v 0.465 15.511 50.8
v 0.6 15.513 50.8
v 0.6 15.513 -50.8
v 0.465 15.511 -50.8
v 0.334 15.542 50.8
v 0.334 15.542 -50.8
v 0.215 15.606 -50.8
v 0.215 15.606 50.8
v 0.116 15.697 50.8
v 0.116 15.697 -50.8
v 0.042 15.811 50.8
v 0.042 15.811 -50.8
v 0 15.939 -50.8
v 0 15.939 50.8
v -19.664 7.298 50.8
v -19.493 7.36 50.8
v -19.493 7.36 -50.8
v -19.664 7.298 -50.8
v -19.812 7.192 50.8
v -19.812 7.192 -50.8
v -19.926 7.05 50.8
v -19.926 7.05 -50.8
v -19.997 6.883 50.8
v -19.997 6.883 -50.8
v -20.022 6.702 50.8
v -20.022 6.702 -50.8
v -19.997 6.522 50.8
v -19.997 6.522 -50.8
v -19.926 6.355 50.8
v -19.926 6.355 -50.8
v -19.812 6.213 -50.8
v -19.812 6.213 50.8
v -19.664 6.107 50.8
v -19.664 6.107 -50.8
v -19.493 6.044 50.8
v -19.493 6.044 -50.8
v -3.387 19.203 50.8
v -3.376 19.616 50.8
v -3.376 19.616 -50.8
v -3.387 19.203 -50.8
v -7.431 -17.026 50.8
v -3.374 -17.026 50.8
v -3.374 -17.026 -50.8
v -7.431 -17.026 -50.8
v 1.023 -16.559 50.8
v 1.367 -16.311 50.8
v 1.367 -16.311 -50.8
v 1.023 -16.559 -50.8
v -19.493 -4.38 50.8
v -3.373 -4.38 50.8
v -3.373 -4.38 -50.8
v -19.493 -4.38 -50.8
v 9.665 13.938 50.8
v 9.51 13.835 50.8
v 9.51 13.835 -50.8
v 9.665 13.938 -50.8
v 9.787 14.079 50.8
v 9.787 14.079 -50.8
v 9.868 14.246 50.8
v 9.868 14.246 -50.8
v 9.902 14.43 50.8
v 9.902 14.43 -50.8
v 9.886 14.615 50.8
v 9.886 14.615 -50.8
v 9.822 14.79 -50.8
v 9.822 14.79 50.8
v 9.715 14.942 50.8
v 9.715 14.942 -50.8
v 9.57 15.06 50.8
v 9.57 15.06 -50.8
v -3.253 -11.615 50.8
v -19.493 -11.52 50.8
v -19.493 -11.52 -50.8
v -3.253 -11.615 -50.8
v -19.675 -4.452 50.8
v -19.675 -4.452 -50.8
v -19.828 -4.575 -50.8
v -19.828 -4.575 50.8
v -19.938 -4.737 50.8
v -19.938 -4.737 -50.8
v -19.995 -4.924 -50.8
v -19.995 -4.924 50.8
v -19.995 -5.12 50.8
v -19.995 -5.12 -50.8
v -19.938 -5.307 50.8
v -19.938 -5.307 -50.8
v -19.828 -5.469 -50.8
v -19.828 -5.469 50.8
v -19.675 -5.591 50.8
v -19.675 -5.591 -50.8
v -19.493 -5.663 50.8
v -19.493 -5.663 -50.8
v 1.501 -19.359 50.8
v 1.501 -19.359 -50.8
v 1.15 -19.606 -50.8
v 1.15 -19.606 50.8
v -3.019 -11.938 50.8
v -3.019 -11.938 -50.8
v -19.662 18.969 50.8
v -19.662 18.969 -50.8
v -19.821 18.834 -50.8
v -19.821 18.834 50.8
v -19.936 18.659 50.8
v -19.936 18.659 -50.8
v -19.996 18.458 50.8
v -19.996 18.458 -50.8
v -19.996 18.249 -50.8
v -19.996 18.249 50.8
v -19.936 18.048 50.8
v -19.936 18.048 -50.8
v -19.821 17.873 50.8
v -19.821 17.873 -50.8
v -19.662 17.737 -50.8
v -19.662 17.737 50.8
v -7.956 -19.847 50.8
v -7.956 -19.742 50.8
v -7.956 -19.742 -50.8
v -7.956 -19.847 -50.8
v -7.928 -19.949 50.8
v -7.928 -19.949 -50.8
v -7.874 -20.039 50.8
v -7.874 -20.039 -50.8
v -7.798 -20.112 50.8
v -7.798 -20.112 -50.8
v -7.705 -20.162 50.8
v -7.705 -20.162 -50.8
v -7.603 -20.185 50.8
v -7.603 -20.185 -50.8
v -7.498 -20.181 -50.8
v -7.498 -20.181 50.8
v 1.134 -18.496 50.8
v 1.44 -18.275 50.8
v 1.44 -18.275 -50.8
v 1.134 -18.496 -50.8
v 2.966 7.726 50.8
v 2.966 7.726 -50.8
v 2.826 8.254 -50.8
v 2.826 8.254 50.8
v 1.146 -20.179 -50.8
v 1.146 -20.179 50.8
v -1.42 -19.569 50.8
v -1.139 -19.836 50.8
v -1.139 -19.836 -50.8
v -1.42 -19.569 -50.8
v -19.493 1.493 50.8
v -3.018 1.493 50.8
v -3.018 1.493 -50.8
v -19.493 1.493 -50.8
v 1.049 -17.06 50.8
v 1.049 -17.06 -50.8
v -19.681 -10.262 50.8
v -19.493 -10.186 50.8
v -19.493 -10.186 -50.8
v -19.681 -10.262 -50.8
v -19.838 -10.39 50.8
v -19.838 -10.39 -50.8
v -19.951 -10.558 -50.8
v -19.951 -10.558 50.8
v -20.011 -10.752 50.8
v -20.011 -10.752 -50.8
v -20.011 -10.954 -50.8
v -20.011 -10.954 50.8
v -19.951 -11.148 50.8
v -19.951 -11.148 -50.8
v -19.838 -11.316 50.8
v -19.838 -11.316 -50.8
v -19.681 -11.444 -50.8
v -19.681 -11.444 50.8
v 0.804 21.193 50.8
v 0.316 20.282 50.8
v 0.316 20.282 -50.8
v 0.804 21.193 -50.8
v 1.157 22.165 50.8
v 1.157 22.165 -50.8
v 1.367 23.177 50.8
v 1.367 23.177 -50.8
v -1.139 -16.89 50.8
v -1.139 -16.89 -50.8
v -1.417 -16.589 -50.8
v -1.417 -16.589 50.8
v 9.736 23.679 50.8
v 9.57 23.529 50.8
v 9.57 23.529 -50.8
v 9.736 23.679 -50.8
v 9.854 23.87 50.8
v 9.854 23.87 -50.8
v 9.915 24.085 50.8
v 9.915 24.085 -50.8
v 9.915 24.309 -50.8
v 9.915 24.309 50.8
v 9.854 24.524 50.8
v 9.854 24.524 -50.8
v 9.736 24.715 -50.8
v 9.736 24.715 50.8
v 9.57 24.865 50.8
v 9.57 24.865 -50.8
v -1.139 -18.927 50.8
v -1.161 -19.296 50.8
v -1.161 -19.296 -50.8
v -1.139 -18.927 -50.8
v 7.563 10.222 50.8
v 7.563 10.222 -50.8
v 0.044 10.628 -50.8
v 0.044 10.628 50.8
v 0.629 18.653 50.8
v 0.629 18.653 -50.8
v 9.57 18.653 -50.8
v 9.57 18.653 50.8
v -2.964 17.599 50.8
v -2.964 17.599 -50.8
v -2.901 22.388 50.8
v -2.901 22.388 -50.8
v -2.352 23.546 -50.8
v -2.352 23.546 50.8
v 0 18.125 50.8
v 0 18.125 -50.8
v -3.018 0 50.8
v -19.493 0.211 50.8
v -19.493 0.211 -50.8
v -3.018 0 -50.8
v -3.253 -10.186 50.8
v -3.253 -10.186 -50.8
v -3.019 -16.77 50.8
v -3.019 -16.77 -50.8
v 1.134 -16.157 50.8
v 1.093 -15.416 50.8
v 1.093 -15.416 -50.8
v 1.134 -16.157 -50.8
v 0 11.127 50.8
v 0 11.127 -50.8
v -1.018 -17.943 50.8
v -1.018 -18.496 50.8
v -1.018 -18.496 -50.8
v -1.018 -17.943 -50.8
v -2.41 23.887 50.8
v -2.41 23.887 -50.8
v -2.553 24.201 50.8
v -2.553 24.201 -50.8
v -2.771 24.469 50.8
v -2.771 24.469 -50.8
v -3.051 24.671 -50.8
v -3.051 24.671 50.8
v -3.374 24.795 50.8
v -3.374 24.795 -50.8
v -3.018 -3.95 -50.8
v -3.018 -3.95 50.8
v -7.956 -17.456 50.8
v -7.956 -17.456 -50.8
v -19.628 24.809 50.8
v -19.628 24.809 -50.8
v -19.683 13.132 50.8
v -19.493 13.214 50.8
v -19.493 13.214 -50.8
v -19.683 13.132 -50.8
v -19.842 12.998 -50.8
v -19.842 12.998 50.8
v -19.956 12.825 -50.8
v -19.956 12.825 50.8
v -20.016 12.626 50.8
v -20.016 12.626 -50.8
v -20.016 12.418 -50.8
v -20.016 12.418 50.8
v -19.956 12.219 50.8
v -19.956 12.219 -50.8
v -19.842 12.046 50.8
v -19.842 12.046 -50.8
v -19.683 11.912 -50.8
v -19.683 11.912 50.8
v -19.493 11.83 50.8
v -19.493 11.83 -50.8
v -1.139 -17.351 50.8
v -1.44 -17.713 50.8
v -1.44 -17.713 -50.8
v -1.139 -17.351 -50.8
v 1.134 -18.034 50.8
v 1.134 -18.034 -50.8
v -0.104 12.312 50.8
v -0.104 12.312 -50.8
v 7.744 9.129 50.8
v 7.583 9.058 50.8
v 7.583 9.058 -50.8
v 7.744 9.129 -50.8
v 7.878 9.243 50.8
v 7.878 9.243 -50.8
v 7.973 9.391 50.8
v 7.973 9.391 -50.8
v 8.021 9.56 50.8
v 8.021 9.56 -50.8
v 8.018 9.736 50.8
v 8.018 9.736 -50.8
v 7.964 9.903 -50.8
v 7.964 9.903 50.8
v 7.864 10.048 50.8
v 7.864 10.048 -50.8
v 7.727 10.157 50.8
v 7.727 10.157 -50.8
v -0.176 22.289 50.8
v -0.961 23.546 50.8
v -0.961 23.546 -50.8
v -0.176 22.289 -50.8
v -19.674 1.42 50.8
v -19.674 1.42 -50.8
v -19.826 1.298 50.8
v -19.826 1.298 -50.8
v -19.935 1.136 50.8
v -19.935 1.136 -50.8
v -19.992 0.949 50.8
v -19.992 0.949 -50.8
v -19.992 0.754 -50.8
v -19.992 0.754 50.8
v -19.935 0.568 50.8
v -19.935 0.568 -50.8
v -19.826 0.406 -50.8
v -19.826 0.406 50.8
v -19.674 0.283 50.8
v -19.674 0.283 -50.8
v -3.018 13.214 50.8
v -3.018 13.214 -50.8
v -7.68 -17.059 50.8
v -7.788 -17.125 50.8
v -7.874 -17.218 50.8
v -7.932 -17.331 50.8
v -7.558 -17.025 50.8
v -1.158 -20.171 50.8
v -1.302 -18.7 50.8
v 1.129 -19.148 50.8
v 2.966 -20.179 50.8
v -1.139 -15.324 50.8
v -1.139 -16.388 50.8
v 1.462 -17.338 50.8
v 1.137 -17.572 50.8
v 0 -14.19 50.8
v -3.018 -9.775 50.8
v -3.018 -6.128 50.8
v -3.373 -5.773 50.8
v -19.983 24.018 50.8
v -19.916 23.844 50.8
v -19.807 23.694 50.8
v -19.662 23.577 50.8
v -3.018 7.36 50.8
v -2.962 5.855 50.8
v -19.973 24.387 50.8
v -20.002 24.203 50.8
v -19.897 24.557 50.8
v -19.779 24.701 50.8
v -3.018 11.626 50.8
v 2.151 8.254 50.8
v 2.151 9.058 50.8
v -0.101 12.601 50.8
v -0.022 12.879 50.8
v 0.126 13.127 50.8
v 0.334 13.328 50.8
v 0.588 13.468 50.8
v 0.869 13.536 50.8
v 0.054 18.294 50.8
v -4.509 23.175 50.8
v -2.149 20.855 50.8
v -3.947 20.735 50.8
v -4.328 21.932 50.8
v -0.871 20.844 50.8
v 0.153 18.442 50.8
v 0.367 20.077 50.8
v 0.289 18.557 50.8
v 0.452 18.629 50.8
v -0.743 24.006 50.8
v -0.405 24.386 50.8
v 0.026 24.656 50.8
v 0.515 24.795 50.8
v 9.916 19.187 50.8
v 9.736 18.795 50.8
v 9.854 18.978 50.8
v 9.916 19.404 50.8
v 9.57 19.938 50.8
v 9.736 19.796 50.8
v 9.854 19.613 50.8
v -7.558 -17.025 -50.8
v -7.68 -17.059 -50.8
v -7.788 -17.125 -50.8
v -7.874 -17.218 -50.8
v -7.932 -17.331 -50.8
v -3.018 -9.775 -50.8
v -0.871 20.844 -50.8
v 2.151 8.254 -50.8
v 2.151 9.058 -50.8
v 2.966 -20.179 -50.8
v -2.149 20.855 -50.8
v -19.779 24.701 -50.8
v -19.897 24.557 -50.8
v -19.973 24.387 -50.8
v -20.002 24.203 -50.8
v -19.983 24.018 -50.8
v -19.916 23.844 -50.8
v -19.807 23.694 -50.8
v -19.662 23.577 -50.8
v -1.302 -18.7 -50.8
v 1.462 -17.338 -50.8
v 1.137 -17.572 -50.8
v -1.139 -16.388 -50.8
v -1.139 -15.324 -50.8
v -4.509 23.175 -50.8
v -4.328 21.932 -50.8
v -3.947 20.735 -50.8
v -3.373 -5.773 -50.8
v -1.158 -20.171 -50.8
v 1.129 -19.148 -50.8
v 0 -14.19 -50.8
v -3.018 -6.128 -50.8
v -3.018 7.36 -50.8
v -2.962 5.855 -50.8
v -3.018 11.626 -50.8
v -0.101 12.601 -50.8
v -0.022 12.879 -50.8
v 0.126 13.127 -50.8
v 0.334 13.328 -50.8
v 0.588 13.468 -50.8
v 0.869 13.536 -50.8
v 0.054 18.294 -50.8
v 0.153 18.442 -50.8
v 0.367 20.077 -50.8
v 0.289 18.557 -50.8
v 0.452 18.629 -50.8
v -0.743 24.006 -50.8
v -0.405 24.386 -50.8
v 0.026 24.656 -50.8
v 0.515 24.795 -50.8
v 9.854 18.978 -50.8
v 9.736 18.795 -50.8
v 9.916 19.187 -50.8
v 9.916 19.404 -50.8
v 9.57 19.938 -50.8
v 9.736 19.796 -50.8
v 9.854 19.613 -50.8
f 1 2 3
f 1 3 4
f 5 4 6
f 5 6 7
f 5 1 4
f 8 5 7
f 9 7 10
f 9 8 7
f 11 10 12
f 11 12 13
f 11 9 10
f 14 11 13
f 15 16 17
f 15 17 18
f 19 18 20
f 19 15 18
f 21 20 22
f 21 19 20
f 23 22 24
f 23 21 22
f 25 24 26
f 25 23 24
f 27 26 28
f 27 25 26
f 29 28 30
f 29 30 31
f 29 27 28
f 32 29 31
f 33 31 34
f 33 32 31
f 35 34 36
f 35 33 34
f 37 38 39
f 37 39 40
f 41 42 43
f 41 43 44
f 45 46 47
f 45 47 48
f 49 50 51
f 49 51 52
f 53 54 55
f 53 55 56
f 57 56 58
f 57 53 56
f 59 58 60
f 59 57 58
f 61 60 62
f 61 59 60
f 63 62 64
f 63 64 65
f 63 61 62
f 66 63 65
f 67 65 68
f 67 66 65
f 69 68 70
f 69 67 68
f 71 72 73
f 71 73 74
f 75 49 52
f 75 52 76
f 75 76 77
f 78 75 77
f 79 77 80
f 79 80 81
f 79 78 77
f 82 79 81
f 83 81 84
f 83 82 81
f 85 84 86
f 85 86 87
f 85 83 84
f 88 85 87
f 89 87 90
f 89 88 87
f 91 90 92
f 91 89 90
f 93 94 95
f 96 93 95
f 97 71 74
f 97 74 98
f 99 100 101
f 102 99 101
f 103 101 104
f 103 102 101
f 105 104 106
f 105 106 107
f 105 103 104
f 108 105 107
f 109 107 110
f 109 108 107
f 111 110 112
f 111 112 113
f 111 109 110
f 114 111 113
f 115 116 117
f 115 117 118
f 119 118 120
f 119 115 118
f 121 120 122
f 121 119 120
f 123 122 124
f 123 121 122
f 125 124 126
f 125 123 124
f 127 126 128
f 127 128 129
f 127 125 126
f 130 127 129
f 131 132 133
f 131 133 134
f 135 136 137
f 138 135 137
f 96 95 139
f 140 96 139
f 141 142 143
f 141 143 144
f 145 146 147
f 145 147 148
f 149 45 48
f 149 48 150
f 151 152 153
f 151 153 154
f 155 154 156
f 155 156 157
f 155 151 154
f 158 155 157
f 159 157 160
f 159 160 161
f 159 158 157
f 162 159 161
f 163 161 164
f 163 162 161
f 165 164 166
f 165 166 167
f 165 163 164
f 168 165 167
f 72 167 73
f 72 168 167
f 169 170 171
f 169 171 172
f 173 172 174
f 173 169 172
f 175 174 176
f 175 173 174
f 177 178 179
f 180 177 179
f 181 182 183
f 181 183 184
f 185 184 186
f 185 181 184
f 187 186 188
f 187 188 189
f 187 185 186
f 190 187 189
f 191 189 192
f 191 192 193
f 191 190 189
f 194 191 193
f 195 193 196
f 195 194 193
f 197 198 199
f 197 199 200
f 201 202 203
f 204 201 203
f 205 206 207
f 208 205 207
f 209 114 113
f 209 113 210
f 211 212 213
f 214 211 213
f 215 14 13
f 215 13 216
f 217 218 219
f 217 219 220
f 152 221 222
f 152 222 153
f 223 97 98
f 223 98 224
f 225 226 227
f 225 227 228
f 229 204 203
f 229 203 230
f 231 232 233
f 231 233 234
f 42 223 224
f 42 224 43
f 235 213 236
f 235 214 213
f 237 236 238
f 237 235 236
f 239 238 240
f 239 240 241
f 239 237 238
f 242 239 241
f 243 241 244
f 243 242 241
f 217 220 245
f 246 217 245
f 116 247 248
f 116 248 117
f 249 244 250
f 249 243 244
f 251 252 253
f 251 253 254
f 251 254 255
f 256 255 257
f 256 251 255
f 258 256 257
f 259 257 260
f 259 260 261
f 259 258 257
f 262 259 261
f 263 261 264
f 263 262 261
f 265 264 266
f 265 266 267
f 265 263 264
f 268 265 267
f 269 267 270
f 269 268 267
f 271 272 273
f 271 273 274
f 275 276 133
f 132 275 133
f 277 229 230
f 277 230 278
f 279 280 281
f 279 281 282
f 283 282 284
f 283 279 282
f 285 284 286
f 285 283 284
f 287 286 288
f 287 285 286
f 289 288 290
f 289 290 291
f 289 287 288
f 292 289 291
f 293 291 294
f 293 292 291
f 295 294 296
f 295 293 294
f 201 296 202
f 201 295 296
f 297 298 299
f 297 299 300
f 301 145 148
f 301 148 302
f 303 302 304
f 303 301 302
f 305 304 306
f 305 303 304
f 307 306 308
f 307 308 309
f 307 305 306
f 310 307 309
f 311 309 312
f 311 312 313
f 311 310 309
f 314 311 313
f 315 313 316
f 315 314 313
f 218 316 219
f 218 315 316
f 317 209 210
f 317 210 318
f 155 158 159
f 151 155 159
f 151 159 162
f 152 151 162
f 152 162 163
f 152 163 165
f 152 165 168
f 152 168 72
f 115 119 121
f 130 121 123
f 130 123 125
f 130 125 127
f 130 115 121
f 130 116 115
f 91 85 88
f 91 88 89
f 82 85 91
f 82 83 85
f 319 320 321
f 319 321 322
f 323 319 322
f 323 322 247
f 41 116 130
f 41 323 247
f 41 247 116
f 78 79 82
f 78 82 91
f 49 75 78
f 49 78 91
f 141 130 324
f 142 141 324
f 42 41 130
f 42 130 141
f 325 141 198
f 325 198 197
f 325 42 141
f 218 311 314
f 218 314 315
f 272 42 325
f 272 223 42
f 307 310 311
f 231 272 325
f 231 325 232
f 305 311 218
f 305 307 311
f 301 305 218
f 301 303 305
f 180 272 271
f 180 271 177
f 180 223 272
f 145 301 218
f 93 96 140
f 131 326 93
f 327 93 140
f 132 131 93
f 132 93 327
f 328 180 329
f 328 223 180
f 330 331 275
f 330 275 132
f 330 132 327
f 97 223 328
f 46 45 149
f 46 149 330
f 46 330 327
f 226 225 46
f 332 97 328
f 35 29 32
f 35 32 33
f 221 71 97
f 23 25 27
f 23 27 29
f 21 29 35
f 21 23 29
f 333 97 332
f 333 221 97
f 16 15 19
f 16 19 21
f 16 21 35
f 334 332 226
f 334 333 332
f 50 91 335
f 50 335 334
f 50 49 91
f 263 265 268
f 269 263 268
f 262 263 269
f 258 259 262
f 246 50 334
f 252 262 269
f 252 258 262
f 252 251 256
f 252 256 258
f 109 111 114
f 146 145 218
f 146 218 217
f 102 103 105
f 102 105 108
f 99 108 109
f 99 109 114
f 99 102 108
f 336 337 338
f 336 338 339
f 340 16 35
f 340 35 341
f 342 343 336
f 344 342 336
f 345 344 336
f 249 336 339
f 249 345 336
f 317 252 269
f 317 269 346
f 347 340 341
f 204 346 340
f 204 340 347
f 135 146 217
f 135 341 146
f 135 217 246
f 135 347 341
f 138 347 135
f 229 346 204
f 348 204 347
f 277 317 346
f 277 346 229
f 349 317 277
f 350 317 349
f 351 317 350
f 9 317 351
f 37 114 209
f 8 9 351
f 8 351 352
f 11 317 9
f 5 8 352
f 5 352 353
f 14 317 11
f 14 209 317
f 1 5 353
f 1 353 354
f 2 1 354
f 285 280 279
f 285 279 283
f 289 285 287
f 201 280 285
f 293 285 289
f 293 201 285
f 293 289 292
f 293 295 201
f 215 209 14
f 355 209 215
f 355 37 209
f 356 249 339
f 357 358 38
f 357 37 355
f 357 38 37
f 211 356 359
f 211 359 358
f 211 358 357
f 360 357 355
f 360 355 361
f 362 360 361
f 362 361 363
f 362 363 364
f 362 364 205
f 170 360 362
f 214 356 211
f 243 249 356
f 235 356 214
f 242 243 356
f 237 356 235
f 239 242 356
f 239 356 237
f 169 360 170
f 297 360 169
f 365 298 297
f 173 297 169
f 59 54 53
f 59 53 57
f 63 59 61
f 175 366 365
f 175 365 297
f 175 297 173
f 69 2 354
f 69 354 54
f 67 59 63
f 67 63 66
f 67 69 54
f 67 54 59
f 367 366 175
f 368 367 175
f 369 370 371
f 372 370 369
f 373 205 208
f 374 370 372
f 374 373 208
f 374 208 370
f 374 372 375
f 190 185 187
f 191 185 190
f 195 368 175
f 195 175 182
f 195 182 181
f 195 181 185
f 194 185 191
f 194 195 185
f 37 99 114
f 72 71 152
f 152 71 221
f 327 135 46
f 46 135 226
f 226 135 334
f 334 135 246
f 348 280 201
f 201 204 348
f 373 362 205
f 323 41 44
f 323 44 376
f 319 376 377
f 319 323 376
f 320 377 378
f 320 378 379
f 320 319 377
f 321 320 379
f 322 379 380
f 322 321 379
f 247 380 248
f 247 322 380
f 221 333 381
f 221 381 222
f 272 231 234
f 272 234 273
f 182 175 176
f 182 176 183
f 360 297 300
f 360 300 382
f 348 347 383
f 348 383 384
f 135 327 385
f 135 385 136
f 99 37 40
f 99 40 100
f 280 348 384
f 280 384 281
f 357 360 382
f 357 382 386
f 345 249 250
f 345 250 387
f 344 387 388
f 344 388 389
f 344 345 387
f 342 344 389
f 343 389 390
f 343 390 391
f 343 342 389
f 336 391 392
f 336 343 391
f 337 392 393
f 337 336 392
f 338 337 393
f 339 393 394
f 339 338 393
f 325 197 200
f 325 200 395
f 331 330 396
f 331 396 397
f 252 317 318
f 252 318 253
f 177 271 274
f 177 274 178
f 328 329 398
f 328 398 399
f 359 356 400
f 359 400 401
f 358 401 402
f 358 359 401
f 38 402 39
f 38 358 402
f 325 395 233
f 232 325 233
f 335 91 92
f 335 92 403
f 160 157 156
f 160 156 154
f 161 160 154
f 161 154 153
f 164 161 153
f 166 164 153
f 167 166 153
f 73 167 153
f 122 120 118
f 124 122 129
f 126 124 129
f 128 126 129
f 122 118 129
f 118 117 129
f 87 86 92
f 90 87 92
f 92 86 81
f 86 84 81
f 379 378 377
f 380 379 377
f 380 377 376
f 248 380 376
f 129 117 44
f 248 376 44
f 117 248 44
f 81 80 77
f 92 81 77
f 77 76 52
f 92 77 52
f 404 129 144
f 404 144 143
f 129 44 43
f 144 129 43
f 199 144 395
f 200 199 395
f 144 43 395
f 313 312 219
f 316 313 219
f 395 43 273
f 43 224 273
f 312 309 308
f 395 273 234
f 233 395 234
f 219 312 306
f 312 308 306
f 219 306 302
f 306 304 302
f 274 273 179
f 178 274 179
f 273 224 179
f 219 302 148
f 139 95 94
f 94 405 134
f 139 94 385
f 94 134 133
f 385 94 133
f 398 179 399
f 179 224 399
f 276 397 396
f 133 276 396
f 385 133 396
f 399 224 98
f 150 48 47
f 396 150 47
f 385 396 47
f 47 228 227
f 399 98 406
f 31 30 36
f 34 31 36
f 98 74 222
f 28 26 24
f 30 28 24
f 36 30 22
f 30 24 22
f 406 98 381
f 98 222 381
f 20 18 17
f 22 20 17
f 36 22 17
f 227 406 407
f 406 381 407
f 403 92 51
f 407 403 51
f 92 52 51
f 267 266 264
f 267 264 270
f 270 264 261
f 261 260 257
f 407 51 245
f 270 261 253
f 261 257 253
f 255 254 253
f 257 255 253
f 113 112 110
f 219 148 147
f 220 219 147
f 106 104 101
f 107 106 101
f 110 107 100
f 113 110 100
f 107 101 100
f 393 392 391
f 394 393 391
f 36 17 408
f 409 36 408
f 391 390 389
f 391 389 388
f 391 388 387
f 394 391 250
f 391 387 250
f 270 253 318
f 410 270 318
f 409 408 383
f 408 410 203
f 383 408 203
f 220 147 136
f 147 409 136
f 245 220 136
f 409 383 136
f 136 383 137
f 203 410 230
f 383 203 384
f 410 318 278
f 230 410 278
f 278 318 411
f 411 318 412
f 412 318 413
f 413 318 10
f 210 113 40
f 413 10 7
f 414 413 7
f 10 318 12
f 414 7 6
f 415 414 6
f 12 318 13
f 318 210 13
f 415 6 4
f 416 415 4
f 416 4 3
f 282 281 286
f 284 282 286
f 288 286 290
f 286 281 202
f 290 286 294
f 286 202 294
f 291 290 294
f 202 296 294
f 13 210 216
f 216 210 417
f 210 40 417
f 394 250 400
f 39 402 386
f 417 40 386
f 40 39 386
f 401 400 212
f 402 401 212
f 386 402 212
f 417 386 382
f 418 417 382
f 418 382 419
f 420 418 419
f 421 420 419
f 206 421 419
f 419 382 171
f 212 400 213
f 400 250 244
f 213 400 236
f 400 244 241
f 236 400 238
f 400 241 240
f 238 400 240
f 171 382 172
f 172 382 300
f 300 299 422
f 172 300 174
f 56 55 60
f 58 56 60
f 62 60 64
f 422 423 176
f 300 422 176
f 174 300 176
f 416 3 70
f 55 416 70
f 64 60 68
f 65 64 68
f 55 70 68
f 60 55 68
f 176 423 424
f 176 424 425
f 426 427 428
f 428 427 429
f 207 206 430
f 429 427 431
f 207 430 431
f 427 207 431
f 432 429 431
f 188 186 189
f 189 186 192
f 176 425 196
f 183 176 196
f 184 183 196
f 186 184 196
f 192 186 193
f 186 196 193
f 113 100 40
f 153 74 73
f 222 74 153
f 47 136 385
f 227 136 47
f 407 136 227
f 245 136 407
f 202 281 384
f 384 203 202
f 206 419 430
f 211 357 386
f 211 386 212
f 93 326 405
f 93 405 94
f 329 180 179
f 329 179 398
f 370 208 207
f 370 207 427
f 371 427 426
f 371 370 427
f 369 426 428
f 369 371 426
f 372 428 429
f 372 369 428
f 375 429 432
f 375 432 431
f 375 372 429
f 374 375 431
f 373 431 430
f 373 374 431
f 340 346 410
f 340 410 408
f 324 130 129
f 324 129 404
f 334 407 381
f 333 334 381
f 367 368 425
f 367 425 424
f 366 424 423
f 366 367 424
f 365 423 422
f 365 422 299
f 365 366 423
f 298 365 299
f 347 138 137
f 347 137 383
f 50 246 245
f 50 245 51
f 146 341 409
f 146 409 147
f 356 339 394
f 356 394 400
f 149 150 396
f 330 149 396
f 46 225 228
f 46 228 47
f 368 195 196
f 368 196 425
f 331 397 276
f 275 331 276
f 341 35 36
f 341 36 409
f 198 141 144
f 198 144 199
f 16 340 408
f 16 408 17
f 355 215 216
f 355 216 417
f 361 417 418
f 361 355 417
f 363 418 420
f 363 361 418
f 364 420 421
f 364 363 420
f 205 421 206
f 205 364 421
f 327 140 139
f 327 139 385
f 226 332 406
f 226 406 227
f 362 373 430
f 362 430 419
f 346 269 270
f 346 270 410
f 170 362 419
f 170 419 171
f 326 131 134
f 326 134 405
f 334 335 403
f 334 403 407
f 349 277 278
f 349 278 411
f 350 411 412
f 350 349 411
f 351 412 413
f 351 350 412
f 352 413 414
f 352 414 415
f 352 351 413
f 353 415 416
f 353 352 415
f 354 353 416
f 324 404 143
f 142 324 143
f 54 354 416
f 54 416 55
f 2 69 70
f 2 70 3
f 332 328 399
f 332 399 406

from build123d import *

# Parameters (mm, degrees)
F1_DEPTH      = 50.8
F1_DEPTH_BACK = 50.8


# Not quite as in the source:
# - a feature of the source that left no trace in its solid (it failed there, or was rolled back) is left out
# - the program builds the solid bodies; features that only make, move or delete a surface that nothing else refers to are left out


with BuildPart() as f1:
    # F0 (on Top) → F1 (new body, two sides)
    with BuildSketch(Plane.XY) as f1_sk:
        with BuildLine():
            Line((-3.3736736514, 24.7951317579), (-19.627969712, 24.8093213886))
            ThreePointArc((-19.627969712, 24.8093213886), (-20.0021253233, 24.2030567982), (-19.6617264301, 23.57721515))
            Line((-19.6617264301, 23.57721515), (-4.5088279332, 23.1754036615))
            ThreePointArc((-4.5088279332, 23.1754036615), (-4.1624050394, 21.325828975), (-3.3758739325, 19.6163541549))
            Line((-3.3758739325, 19.6163541549), (-3.3873883076, 19.2034132779))
            Line((-3.3873883076, 19.2034132779), (-19.6617264301, 18.969476223))
            ThreePointArc((-19.6617264301, 18.969476223), (-20.0032717352, 18.3534221724), (-19.6617264301, 17.7373681217))
            Line((-19.6617264301, 17.7373681217), (-2.9635052222, 17.5993758319))
            Line((-2.9635052222, 17.5993758319), (-3.0178399757, 13.2140200585))
            Line((-3.0178399757, 13.2140200585), (-19.4929447025, 13.2140200585))
            ThreePointArc((-19.4929447025, 13.2140200585), (-20.0233587748, 12.5220152549), (-19.4929447025, 11.8300104514))
            Line((-19.4929447025, 11.8300104514), (-3.0178399757, 11.6258831695))
            Line((-3.0178399757, 11.6258831695), (-3.0178399757, 7.360490039))
            Line((-3.0178399757, 7.360490039), (-19.4929447025, 7.360490039))
            ThreePointArc((-19.4929447025, 7.360490039), (-20.0219986391, 6.7022417206), (-19.4929447025, 6.0439934023))
            Line((-19.4929447025, 6.0439934023), (-2.9621112743, 5.8546986264))
            Line((-2.9621112743, 5.8546986264), (-3.0178399757, 1.493252581))
            Line((-3.0178399757, 1.493252581), (-19.4929447025, 1.493252581))
            ThreePointArc((-19.4929447025, 1.493252581), (-19.999079636, 0.8518822287), (-19.4929447025, 0.2105118765))
            Line((-19.4929447025, 0.2105118765), (-3.0178399757, 0))
            Line((-3.0178399757, 0), (-3.0178399757, -3.950452432))
            Line((-3.0178399757, -3.950452432), (-3.3726599067, -4.3803495355))
            Line((-3.3726599067, -4.3803495355), (-19.4929447025, -4.3803495355))
            ThreePointArc((-19.4929447025, -4.3803495355), (-20.0026487971, -5.0217199605), (-19.4929447025, -5.6630903855))
            Line((-19.4929447025, -5.6630903855), (-3.3726599067, -5.7729091495))
            Line((-3.3726599067, -5.7729091495), (-3.0178399757, -6.1277290806))
            Line((-3.0178399757, -6.1277290806), (-3.0178399757, -9.7752762958))
            Line((-3.0178399757, -9.7752762958), (-3.2525765998, -10.18643938))
            Line((-3.2525765998, -10.18643938), (-19.4929447025, -10.18643938))
            ThreePointArc((-19.4929447025, -10.18643938), (-20.0181876942, -10.8531266451), (-19.4929447025, -11.5198139101))
            Line((-19.4929447025, -11.5198139101), (-3.2525765998, -11.6145808049))
            Line((-3.2525765998, -11.6145808049), (-3.0190503156, -11.9383819401))
            Line((-3.0190503156, -11.9383819401), (-3.0190503156, -16.7704734888))
            Line((-3.0190503156, -16.7704734888), (-3.3736736514, -17.0262288302))
            Line((-3.3736736514, -17.0262288302), (-7.4309431948, -17.0262288302))
            ThreePointArc((-7.4309431948, -17.0262288302), (-7.7883055211, -17.1251856492), (-7.9560680315, -17.4558758736))
            Line((-7.9560680315, -17.4558758736), (-7.9560680315, -19.7419915348))
            ThreePointArc((-7.9560680315, -19.7419915348), (-7.8385182356, -20.0781647595), (-7.497502665, -20.1808232814))
            Line((-7.497502665, -20.1808232814), (-1.1584198955, -20.1714233881))
            Line((-1.1584198955, -20.1714233881), (-1.138712159, -19.8357657809))
            Line((-1.138712159, -19.8357657809), (-1.4197152341, -19.5692516863))
            Line((-1.4197152341, -19.5692516863), (-1.160888255, -19.2963536351))
            Line((-1.160888255, -19.2963536351), (-1.138712159, -18.9265421938))
            Line((-1.138712159, -18.9265421938), (-1.3017905422, -18.7004221842))
            Line((-1.3017905422, -18.7004221842), (-1.0179714863, -18.4957310875))
            Line((-1.0179714863, -18.4957310875), (-1.018282466, -17.9434493202))
            Line((-1.018282466, -17.9434493202), (-1.4397868638, -17.7126266085))
            Line((-1.4397868638, -17.7126266085), (-1.138712159, -17.3513367812))
            Line((-1.138712159, -17.3513367812), (-1.138712159, -16.8896894959))
            Line((-1.138712159, -16.8896894959), (-1.4169517005, -16.588565616))
            Line((-1.4169517005, -16.588565616), (-1.138712159, -16.3878984806))
            Line((-1.138712159, -16.3878984806), (-1.138712159, -15.3241008577))
            Line((-1.138712159, -15.3241008577), (0, -14.1900535673))
            Line((0, -14.1900535673), (1.0927112374, -15.4159043089))
            Line((1.0927112374, -15.4159043089), (1.1339221451, -16.1570739001))
            Line((1.1339221451, -16.1570739001), (1.3667184391, -16.3108690956))
            Line((1.3667184391, -16.3108690956), (1.0229069001, -16.558826939))
            Line((1.0229069001, -16.558826939), (1.0490959976, -17.0602984726))
            Line((1.0490959976, -17.0602984726), (1.462081531, -17.337922364))
            Line((1.462081531, -17.337922364), (1.1371706318, -17.572249013))
            Line((1.1371706318, -17.572249013), (1.1339221451, -18.033772707))
            Line((1.1339221451, -18.033772707), (1.4404929399, -18.274631373))
            Line((1.4404929399, -18.274631373), (1.1339221451, -18.4957310875))
            Line((1.1339221451, -18.4957310875), (1.1293826392, -19.1477481276))
            Line((1.1293826392, -19.1477481276), (1.5007078182, -19.3585008383))
            Line((1.5007078182, -19.3585008383), (1.1495453005, -19.6058004949))
            Line((1.1495453005, -19.6058004949), (1.1458612277, -20.178947635))
            Line((1.1458612277, -20.178947635), (2.9662006887, -20.178947635))
            Line((2.9662006887, -20.178947635), (2.9662006887, 7.7263202994))
            Line((2.9662006887, 7.7263202994), (2.825798234, 8.2537010312))
            Line((2.825798234, 8.2537010312), (2.1506715566, 8.2537010312))
            Line((2.1506715566, 8.2537010312), (2.1506715566, 9.0581281111))
            Line((2.1506715566, 9.0581281111), (7.5833620504, 9.0581281111))
            ThreePointArc((7.5833620504, 9.0581281111), (8.0257459726, 9.6480058962), (7.5632906519, 10.222283192))
            Line((7.5632906519, 10.222283192), (0.0440248574, 10.6278444304))
            Line((0.0440248574, 10.6278444304), (0, 11.1270683113))
            Line((0, 11.1270683113), (-0.1044616438, 12.3116206378))
            ThreePointArc((-0.1044616438, 12.3116206378), (0.126172228, 13.1274286151), (0.8690126706, 13.5359903798))
            Line((0.8690126706, 13.5359903798), (9.5102395862, 13.8351768255))
            ThreePointArc((9.5102395862, 13.8351768255), (9.9020840969, 14.4295718757), (9.570454247, 15.0595474616))
            Line((9.570454247, 15.0595474616), (0.6003075975, 15.5130466074))
            ThreePointArc((0.6003075975, 15.5130466074), (0.2149232739, 15.60577238), (0, 15.9388296306))
            Line((0, 15.9388296306), (0, 18.1245207787))
            ThreePointArc((0, 18.1245207787), (0.2171557282, 18.5044688755), (0.6286933785, 18.6533108354))
            Line((0.6286933785, 18.6533108354), (9.570454247, 18.6533108354))
            ThreePointArc((9.570454247, 18.6533108354), (9.9234885577, 19.2956030182), (9.570454247, 19.9378952011))
            Line((9.570454247, 19.9378952011), (0.3673353055, 20.0769044086))
            Line((0.3673353055, 20.0769044086), (0.3164518273, 20.2818233147))
            ThreePointArc((0.3164518273, 20.2818233147), (0.9977498793, 21.6728398839), (1.3667184391, 23.1771524623))
            Line((1.3667184391, 23.1771524623), (9.570454247, 23.5285814479))
            ThreePointArc((9.570454247, 23.5285814479), (9.9232117791, 24.1969227418), (9.570454247, 24.8652640357))
            Line((9.570454247, 24.8652640357), (0.5151510704, 24.7951317579))
            ThreePointArc((0.5151510704, 24.7951317579), (-0.4052105617, 24.3861366082), (-0.9608993423, 23.5461648554))
            Line((-0.9608993423, 23.5461648554), (-0.1758071594, 22.2885161638))
            Line((-0.1758071594, 22.2885161638), (-0.8712234916, 20.8444888061))
            Line((-0.8712234916, 20.8444888061), (-2.148604719, 20.8550449461))
            Line((-2.148604719, 20.8550449461), (-2.9008225538, 22.3878659308))
            Line((-2.9008225538, 22.3878659308), (-2.3517927621, 23.5461648554))
            ThreePointArc((-2.3517927621, 23.5461648554), (-2.6533703145, 24.3419450304), (-3.3736736514, 24.7951317579))
        make_face()
    extrude(amount=F1_DEPTH)
    extrude(f1_sk.sketch, amount=-F1_DEPTH_BACK)


solid = f1.part
